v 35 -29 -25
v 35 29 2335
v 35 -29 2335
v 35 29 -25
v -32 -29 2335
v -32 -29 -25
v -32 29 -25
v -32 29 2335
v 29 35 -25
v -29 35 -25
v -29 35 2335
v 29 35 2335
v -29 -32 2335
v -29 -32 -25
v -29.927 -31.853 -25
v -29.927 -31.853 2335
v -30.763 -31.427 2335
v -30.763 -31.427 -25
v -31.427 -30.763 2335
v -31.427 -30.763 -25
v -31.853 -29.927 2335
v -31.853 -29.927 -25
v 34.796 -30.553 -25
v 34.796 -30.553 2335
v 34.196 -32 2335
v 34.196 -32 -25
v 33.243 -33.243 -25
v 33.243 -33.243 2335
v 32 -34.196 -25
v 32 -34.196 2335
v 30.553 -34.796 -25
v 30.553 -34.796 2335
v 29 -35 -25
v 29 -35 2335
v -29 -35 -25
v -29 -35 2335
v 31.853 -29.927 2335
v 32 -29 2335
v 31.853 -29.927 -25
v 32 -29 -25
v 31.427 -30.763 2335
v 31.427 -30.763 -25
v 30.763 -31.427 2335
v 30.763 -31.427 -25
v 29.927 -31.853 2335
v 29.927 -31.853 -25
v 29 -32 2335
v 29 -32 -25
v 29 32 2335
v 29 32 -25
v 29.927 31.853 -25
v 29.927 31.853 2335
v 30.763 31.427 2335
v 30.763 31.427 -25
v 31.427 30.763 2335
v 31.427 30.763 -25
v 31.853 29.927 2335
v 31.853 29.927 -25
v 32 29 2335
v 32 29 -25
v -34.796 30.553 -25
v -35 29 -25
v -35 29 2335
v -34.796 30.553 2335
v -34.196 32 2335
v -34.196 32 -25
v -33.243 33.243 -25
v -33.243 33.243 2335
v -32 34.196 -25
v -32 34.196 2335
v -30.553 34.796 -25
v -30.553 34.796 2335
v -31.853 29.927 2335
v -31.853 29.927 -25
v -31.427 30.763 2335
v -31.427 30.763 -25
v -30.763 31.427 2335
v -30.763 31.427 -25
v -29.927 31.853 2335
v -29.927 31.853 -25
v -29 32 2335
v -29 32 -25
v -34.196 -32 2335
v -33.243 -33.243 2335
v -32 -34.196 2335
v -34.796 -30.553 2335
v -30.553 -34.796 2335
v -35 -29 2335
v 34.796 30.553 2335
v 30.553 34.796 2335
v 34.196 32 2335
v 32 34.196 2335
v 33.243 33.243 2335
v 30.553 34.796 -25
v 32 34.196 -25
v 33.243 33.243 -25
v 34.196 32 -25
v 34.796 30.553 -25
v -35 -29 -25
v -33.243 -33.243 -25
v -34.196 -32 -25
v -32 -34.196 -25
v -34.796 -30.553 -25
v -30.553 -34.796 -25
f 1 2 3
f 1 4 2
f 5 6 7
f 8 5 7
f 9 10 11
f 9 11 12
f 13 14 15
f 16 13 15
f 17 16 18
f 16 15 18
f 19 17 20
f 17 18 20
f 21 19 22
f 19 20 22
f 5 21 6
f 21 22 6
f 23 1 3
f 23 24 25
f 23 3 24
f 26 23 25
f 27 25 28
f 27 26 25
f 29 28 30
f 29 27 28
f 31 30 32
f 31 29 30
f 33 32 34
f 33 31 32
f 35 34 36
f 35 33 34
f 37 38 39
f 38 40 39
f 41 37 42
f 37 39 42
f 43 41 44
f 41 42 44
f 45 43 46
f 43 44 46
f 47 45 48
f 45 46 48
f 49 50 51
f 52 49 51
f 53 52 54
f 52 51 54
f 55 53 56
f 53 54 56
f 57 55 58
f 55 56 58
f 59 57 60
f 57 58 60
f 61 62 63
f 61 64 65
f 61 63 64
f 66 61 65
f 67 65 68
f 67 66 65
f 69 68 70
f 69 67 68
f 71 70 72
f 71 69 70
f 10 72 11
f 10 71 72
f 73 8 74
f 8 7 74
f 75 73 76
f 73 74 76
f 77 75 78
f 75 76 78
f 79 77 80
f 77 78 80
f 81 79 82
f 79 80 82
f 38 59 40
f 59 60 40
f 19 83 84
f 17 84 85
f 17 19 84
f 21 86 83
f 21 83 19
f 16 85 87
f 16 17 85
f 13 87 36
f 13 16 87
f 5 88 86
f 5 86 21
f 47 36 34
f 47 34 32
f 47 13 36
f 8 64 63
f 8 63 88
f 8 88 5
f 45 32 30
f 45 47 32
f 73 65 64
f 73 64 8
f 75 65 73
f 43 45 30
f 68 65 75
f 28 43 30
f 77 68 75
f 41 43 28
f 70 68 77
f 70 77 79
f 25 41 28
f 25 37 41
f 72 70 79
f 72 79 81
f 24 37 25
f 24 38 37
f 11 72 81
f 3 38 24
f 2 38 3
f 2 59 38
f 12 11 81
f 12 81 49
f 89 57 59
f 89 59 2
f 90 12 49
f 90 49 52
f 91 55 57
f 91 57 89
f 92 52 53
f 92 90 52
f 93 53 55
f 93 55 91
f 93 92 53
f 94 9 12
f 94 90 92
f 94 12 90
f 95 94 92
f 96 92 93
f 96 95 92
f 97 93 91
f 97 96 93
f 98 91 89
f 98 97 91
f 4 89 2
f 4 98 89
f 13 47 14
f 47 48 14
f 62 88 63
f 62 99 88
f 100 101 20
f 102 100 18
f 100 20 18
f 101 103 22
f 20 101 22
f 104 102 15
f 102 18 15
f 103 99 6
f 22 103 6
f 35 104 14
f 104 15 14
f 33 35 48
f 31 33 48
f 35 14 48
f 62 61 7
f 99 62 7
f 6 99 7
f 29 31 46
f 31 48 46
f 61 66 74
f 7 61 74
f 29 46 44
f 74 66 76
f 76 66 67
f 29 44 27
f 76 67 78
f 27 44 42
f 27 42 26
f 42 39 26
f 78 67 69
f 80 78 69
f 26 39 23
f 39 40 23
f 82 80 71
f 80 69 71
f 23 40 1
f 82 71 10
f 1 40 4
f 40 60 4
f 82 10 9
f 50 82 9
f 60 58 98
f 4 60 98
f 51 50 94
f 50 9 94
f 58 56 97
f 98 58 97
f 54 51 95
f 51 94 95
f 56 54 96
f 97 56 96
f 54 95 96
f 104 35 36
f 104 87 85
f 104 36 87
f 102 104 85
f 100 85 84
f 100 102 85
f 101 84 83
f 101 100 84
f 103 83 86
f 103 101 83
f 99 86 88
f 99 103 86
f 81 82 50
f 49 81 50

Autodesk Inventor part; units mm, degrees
ref_plane "Start Plane" through (0, 0, -25) normal (0, 0, 1) x (1, 0, 0)
ref_plane "End Plane" through (0, 0, 2335) normal (0, 0, 1) x (1, 0, 0)
sketch "Sketch" plane through (0, 0, 0) normal (0, 0, 1) x (1, 0, 0)
  line L0 (-35, -29) -> (-35, 29)
  line L1 (-29, 35) -> (29, 35)
  line L2 (35, 29) -> (35, -29)
  line L3 (29, -35) -> (-29, -35)
  arc A0 (-35, -29) -> (-29, -35) centre (-29, -29) ccw
  arc A1 (35, 29) -> (29, 35) centre (29, 29) ccw
  arc A2 (-29, 35) -> (-35, 29) centre (-29, 29) ccw
  arc A3 (29, -35) -> (35, -29) centre (29, -29) ccw
  arc A4 (-29, 32) -> (-32, 29) centre (-29, 29) ccw
  line L4 (-29, 32) -> (29, 32)
  arc A5 (32, 29) -> (29, 32) centre (29, 29) ccw
  line L5 (32, 29) -> (32, -29)
  arc A6 (29, -32) -> (32, -29) centre (29, -29) ccw
  line L6 (29, -32) -> (-29, -32)
  arc A7 (-32, -29) -> (-29, -32) centre (-29, -29) ccw
  line L7 (-32, -29) -> (-32, 29)
  line L8 (0, 50.7397) -> (0, -50.7397) construction
  line L9 (-50.7397, 0) -> (50.7397, 0) construction
  dimension "d7" = 6
  dimension "d9" = 70
  dimension "d11" = 70
  dimension "d12" = 3
  dimension "d15" = 35
  dimension "d16" = 35
extrude "Body" add sketch "Sketch" along normal up to surface (2360 mm away) from surface at -25
sketch "Sketch3" plane through (0, 0, 0) normal (0, 0, 1) x (1, 0, 0)
  line L0 (0, 0) -> (10, 0)
ref_plane "Work Plane3" through (0, 0, 0) normal (0, -1, 0) x (1, 0, 0)
sketch "Sketch4" plane through (0, 0, 0) normal (0, -1, 0) x (1, 0, 0)
  line L0 (-2, -25) -> (12, -25)
  line L1 (-2, 2335) -> (12, 2335)
  dimension "d18" = 2360
ref_plane "Work Plane4" through (0, 21, -25) normal (0, 0, -1) x (-1, 0, 0)
split "Split1" plane through (0, 21, -25) removes the side toward (0, 0, -1)
ref_plane "Work Plane5" through (0, -21, 2335) normal (0, 0, 1) x (1, 0, 0)
split "Split2" plane through (0, -21, 2335) removes the side toward (0, 0, 1)
equation "\"d7\" = G_IR"
equation "\"d9\" = G_W"
equation "\"d11\" = G_H"
equation "\"d12\" = G_T"
equation "\"d15\" = 0.5 * d9"
equation "\"d16\" = 0.5 * d11"
equation "\"d3\" = G_L"
equation "\"G_W\" = 70"
equation "\"G_H\" = 70"
equation "\"G_T\" = 3"
equation "\"G_IR\" = 6"
equation "\"G_L\" = d18"
equation "\"G_OFFSET_START\" = 25"
equation "\"G_OFFSET_END\" = 25"
equation "\"d13\" = -G_OFFSET_START"
equation "\"d14\" = G_OFFSET_END + B_L"
equation "\"B_L\" = 2310"
properties part number "ISO 10799-2 - 70x70x3 - 2360" material "Galvanizado catalogo 2"
